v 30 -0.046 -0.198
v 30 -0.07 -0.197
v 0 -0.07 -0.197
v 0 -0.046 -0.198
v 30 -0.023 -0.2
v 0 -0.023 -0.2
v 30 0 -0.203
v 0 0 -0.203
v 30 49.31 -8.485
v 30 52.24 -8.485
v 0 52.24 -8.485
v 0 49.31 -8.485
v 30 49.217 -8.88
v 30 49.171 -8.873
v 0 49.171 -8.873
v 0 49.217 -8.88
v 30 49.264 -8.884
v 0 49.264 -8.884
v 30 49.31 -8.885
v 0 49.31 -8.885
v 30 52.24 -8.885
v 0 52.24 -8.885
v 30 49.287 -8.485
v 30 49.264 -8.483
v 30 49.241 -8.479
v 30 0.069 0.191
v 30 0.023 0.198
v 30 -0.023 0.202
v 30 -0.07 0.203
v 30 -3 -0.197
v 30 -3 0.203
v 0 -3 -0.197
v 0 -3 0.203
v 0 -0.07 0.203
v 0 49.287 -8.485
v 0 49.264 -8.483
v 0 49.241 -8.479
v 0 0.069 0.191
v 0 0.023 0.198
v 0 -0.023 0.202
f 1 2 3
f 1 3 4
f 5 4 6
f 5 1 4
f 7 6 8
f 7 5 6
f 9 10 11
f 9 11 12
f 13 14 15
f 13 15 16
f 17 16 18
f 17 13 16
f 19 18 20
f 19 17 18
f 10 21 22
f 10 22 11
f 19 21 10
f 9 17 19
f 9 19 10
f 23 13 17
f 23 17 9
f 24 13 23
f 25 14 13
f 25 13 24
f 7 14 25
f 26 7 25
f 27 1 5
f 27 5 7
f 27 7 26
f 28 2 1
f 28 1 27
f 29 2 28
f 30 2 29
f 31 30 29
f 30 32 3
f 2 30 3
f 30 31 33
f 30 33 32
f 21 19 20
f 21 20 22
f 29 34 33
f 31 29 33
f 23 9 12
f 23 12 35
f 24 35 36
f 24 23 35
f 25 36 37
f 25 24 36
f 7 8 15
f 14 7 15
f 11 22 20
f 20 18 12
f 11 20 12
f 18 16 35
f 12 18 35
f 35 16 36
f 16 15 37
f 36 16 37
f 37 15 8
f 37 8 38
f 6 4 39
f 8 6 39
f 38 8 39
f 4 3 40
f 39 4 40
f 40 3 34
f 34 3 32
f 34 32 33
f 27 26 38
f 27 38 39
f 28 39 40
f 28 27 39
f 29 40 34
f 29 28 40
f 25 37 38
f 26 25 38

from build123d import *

# Parameters (mm, degrees)
BOSS_EXTRUDE1_DEPTH          = 30
EDGE_FLANGE1_STRIP_CUT_DEPTH = 30
EDGE_FLANGE1_DEPTH           = 30
EDGE_FLANGE2_STRIP_CUT_DEPTH = 30
EDGE_FLANGE2_DEPTH           = 30


# Sheet-metal steps are written as plain solids
with BuildPart() as part:
    # Sketch1 → Boss-Extrude1 (new body)
    with BuildSketch(Plane(origin=(0, 0, 0), x_dir=(0, 0, -1), z_dir=(1, 0, 0))):
        Polygon((0.196961551, -0.034729636), (8.879370434, 49.205658015), (8.485447333, 49.275117286), (-0.196961551, 0.034729636), align=None)
    extrude(amount=BOSS_EXTRUDE1_DEPTH)

    # Edge-Flange1 strip (across the edge) → Edge-Flange1 strip cut (cut)
    with BuildSketch(Plane(origin=(30, 49.275117286, -8.485447333), x_dir=(0, 0, 1), z_dir=(-1, 0, 0))):
        Polygon((-0.804601829, 2.259615531), (-0.387846202, -0.103923077), (0.006076899, -0.034463806), (-0.410678728, 2.329074802), align=None)
    extrude(amount=EDGE_FLANGE1_STRIP_CUT_DEPTH, mode=Mode.SUBTRACT)

    # Edge-Flange1 section (across the edge) → Edge-Flange1 (add)
    with BuildSketch(Plane(origin=(30, 49.275117286, -8.485447333), x_dir=(0, 0, 1), z_dir=(-1, 0, 0))):
        with BuildLine():
            Line((-0.4, 0.034995465), (-0.4, 2.965004535))
            Line((-0.4, 2.965004535), (0, 2.965004535))
            Line((0, 2.965004535), (0, 0.034995465))
            ThreePointArc((0, 0.034995465), (0.001522121, 0.000133168), (0.006076899, -0.034463806))
            Line((0.006076899, -0.034463806), (-0.387846202, -0.103923077))
            ThreePointArc((-0.387846202, -0.103923077), (-0.396955758, -0.034729129), (-0.4, 0.034995465))
        make_face()
    extrude(amount=EDGE_FLANGE1_DEPTH)

    # Edge-Flange2 strip (across the edge) → Edge-Flange2 strip cut (cut)
    with BuildSketch(Plane(origin=(30, -0.034729636, -0.196961551), x_dir=(0, 0, -1), z_dir=(-1, 0, 0))):
        Polygon((-0.804601829, 2.259615531), (-0.387846202, -0.103923077), (0.006076899, -0.034463806), (-0.410678728, 2.329074802), align=None)
    extrude(amount=EDGE_FLANGE2_STRIP_CUT_DEPTH, mode=Mode.SUBTRACT)

    # Edge-Flange2 section (across the edge) → Edge-Flange2 (add)
    with BuildSketch(Plane(origin=(30, -0.034729636, -0.196961551), x_dir=(0, 0, -1), z_dir=(-1, 0, 0))):
        with BuildLine():
            Line((-0.4, 0.034995465), (-0.4, 2.965004535))
            Line((-0.4, 2.965004535), (0, 2.965004535))
            Line((0, 2.965004535), (0, 0.034995465))
            ThreePointArc((0, 0.034995465), (0.001522121, 0.000133168), (0.006076899, -0.034463806))
            Line((0.006076899, -0.034463806), (-0.387846202, -0.103923077))
            ThreePointArc((-0.387846202, -0.103923077), (-0.396955758, -0.034729129), (-0.4, 0.034995465))
        make_face()
    extrude(amount=EDGE_FLANGE2_DEPTH)


solid = part.part
